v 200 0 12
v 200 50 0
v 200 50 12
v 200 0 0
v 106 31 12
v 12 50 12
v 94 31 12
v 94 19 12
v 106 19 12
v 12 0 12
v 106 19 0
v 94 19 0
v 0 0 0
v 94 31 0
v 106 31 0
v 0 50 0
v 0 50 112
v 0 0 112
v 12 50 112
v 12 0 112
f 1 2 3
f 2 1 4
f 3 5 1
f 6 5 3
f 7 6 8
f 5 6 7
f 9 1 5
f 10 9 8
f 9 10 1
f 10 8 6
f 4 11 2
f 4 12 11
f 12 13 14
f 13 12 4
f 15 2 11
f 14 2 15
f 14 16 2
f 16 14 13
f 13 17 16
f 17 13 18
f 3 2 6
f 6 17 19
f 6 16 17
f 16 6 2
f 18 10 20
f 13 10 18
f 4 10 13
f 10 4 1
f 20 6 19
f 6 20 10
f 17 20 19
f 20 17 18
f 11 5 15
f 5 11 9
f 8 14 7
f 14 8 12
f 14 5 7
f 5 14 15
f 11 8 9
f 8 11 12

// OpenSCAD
$fn = 32;

// ----------------------------------------------------------------------
// Gantry bracket: 200-250 mm L bracket
// ----------------------------------------------------------------------

// --- parameters (mm) ---
base_l = 200;             // base arm length, X
arm_w = 50;               // arm width, Y
thick = 12;               // arm thickness
up_h = 100;               // vertical arm height, Z
slot_w = 12;              // adjustment slot width in the base
fit_tol = 0.02;           // tolerance for press fits, mm
free_tol = 0.2;           // tolerance for clearance fits, mm

total_h = up_h + thick;  // overall height

difference() {
  union() {
    cube([base_l, arm_w, thick]);
    cube([thick, arm_w, total_h]);
  }
  translate([base_l / 2 - slot_w / 2, arm_w / 2 - slot_w / 2, -1])
    cube([slot_w, slot_w, thick + 2]);
}
